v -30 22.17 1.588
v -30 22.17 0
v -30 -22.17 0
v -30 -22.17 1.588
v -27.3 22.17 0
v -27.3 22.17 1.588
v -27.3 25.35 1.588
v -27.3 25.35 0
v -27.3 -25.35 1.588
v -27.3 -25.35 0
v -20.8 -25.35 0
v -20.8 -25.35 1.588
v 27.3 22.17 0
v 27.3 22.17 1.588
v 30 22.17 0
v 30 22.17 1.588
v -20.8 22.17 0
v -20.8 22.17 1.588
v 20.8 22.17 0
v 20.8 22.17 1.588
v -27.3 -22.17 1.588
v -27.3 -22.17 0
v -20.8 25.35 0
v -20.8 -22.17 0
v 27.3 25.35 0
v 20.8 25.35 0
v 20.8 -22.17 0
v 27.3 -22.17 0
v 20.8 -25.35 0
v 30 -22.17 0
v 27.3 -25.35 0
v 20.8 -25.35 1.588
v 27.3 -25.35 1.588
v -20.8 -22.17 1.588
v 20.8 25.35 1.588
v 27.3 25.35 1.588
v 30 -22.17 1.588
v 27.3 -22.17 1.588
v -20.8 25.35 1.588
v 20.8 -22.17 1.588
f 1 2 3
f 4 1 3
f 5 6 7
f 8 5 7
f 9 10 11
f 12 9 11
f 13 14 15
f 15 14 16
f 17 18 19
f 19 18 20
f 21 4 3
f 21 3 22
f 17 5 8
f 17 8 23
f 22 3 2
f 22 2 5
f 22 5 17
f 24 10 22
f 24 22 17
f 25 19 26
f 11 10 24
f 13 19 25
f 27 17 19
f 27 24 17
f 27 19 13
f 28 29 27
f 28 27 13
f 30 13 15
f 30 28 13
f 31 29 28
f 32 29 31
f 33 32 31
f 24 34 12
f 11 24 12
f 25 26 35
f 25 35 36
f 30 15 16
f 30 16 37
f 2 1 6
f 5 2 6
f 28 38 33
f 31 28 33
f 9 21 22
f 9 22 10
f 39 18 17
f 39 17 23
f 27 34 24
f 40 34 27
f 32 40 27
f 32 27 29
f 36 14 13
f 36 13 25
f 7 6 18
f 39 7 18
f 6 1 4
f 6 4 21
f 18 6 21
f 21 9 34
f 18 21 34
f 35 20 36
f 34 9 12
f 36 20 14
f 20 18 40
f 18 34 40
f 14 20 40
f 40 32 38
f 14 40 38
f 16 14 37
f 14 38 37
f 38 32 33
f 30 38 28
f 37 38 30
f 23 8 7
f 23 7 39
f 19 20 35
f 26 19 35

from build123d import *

# Parameters (mm, degrees)
SKETCH1_W           = 60
SKETCH1_H           = 25.35
BOSS_EXTRUDE1_DEPTH = 1.5875
SKETCH2_W           = 41.6
SKETCH2_H           = 3.18
SKETCH2_W_2         = 5.4
CUT_EXTRUDE1_DEPTH  = 1.5875


with BuildPart() as part:
    # Sketch1 → Boss-Extrude1 (new body)
    with BuildSketch(Plane.XY):
        with Locations((0, 12.675)):
            Rectangle(SKETCH1_W, SKETCH1_H)
    boss_extrude1 = extrude(amount=BOSS_EXTRUDE1_DEPTH)

    # Sketch2 → Cut-Extrude1 (cut)
    with BuildSketch(Plane.XY.offset(1.5875)):
        with Locations((0, 23.76)):
            Rectangle(SKETCH2_W, SKETCH2_H)
        with Locations((30, 23.76)):
            Rectangle(SKETCH2_W_2, SKETCH2_H)
        with Locations((-30, 23.76)):
            Rectangle(SKETCH2_W_2, SKETCH2_H)
    cut_extrude1 = extrude(amount=-CUT_EXTRUDE1_DEPTH, mode=Mode.SUBTRACT)

    # Mirror1: Boss-Extrude1, Cut-Extrude1 across plane
    add(boss_extrude1.mirror(Plane.ZX))
    add(cut_extrude1.mirror(Plane.ZX), mode=Mode.SUBTRACT)


solid = part.part
